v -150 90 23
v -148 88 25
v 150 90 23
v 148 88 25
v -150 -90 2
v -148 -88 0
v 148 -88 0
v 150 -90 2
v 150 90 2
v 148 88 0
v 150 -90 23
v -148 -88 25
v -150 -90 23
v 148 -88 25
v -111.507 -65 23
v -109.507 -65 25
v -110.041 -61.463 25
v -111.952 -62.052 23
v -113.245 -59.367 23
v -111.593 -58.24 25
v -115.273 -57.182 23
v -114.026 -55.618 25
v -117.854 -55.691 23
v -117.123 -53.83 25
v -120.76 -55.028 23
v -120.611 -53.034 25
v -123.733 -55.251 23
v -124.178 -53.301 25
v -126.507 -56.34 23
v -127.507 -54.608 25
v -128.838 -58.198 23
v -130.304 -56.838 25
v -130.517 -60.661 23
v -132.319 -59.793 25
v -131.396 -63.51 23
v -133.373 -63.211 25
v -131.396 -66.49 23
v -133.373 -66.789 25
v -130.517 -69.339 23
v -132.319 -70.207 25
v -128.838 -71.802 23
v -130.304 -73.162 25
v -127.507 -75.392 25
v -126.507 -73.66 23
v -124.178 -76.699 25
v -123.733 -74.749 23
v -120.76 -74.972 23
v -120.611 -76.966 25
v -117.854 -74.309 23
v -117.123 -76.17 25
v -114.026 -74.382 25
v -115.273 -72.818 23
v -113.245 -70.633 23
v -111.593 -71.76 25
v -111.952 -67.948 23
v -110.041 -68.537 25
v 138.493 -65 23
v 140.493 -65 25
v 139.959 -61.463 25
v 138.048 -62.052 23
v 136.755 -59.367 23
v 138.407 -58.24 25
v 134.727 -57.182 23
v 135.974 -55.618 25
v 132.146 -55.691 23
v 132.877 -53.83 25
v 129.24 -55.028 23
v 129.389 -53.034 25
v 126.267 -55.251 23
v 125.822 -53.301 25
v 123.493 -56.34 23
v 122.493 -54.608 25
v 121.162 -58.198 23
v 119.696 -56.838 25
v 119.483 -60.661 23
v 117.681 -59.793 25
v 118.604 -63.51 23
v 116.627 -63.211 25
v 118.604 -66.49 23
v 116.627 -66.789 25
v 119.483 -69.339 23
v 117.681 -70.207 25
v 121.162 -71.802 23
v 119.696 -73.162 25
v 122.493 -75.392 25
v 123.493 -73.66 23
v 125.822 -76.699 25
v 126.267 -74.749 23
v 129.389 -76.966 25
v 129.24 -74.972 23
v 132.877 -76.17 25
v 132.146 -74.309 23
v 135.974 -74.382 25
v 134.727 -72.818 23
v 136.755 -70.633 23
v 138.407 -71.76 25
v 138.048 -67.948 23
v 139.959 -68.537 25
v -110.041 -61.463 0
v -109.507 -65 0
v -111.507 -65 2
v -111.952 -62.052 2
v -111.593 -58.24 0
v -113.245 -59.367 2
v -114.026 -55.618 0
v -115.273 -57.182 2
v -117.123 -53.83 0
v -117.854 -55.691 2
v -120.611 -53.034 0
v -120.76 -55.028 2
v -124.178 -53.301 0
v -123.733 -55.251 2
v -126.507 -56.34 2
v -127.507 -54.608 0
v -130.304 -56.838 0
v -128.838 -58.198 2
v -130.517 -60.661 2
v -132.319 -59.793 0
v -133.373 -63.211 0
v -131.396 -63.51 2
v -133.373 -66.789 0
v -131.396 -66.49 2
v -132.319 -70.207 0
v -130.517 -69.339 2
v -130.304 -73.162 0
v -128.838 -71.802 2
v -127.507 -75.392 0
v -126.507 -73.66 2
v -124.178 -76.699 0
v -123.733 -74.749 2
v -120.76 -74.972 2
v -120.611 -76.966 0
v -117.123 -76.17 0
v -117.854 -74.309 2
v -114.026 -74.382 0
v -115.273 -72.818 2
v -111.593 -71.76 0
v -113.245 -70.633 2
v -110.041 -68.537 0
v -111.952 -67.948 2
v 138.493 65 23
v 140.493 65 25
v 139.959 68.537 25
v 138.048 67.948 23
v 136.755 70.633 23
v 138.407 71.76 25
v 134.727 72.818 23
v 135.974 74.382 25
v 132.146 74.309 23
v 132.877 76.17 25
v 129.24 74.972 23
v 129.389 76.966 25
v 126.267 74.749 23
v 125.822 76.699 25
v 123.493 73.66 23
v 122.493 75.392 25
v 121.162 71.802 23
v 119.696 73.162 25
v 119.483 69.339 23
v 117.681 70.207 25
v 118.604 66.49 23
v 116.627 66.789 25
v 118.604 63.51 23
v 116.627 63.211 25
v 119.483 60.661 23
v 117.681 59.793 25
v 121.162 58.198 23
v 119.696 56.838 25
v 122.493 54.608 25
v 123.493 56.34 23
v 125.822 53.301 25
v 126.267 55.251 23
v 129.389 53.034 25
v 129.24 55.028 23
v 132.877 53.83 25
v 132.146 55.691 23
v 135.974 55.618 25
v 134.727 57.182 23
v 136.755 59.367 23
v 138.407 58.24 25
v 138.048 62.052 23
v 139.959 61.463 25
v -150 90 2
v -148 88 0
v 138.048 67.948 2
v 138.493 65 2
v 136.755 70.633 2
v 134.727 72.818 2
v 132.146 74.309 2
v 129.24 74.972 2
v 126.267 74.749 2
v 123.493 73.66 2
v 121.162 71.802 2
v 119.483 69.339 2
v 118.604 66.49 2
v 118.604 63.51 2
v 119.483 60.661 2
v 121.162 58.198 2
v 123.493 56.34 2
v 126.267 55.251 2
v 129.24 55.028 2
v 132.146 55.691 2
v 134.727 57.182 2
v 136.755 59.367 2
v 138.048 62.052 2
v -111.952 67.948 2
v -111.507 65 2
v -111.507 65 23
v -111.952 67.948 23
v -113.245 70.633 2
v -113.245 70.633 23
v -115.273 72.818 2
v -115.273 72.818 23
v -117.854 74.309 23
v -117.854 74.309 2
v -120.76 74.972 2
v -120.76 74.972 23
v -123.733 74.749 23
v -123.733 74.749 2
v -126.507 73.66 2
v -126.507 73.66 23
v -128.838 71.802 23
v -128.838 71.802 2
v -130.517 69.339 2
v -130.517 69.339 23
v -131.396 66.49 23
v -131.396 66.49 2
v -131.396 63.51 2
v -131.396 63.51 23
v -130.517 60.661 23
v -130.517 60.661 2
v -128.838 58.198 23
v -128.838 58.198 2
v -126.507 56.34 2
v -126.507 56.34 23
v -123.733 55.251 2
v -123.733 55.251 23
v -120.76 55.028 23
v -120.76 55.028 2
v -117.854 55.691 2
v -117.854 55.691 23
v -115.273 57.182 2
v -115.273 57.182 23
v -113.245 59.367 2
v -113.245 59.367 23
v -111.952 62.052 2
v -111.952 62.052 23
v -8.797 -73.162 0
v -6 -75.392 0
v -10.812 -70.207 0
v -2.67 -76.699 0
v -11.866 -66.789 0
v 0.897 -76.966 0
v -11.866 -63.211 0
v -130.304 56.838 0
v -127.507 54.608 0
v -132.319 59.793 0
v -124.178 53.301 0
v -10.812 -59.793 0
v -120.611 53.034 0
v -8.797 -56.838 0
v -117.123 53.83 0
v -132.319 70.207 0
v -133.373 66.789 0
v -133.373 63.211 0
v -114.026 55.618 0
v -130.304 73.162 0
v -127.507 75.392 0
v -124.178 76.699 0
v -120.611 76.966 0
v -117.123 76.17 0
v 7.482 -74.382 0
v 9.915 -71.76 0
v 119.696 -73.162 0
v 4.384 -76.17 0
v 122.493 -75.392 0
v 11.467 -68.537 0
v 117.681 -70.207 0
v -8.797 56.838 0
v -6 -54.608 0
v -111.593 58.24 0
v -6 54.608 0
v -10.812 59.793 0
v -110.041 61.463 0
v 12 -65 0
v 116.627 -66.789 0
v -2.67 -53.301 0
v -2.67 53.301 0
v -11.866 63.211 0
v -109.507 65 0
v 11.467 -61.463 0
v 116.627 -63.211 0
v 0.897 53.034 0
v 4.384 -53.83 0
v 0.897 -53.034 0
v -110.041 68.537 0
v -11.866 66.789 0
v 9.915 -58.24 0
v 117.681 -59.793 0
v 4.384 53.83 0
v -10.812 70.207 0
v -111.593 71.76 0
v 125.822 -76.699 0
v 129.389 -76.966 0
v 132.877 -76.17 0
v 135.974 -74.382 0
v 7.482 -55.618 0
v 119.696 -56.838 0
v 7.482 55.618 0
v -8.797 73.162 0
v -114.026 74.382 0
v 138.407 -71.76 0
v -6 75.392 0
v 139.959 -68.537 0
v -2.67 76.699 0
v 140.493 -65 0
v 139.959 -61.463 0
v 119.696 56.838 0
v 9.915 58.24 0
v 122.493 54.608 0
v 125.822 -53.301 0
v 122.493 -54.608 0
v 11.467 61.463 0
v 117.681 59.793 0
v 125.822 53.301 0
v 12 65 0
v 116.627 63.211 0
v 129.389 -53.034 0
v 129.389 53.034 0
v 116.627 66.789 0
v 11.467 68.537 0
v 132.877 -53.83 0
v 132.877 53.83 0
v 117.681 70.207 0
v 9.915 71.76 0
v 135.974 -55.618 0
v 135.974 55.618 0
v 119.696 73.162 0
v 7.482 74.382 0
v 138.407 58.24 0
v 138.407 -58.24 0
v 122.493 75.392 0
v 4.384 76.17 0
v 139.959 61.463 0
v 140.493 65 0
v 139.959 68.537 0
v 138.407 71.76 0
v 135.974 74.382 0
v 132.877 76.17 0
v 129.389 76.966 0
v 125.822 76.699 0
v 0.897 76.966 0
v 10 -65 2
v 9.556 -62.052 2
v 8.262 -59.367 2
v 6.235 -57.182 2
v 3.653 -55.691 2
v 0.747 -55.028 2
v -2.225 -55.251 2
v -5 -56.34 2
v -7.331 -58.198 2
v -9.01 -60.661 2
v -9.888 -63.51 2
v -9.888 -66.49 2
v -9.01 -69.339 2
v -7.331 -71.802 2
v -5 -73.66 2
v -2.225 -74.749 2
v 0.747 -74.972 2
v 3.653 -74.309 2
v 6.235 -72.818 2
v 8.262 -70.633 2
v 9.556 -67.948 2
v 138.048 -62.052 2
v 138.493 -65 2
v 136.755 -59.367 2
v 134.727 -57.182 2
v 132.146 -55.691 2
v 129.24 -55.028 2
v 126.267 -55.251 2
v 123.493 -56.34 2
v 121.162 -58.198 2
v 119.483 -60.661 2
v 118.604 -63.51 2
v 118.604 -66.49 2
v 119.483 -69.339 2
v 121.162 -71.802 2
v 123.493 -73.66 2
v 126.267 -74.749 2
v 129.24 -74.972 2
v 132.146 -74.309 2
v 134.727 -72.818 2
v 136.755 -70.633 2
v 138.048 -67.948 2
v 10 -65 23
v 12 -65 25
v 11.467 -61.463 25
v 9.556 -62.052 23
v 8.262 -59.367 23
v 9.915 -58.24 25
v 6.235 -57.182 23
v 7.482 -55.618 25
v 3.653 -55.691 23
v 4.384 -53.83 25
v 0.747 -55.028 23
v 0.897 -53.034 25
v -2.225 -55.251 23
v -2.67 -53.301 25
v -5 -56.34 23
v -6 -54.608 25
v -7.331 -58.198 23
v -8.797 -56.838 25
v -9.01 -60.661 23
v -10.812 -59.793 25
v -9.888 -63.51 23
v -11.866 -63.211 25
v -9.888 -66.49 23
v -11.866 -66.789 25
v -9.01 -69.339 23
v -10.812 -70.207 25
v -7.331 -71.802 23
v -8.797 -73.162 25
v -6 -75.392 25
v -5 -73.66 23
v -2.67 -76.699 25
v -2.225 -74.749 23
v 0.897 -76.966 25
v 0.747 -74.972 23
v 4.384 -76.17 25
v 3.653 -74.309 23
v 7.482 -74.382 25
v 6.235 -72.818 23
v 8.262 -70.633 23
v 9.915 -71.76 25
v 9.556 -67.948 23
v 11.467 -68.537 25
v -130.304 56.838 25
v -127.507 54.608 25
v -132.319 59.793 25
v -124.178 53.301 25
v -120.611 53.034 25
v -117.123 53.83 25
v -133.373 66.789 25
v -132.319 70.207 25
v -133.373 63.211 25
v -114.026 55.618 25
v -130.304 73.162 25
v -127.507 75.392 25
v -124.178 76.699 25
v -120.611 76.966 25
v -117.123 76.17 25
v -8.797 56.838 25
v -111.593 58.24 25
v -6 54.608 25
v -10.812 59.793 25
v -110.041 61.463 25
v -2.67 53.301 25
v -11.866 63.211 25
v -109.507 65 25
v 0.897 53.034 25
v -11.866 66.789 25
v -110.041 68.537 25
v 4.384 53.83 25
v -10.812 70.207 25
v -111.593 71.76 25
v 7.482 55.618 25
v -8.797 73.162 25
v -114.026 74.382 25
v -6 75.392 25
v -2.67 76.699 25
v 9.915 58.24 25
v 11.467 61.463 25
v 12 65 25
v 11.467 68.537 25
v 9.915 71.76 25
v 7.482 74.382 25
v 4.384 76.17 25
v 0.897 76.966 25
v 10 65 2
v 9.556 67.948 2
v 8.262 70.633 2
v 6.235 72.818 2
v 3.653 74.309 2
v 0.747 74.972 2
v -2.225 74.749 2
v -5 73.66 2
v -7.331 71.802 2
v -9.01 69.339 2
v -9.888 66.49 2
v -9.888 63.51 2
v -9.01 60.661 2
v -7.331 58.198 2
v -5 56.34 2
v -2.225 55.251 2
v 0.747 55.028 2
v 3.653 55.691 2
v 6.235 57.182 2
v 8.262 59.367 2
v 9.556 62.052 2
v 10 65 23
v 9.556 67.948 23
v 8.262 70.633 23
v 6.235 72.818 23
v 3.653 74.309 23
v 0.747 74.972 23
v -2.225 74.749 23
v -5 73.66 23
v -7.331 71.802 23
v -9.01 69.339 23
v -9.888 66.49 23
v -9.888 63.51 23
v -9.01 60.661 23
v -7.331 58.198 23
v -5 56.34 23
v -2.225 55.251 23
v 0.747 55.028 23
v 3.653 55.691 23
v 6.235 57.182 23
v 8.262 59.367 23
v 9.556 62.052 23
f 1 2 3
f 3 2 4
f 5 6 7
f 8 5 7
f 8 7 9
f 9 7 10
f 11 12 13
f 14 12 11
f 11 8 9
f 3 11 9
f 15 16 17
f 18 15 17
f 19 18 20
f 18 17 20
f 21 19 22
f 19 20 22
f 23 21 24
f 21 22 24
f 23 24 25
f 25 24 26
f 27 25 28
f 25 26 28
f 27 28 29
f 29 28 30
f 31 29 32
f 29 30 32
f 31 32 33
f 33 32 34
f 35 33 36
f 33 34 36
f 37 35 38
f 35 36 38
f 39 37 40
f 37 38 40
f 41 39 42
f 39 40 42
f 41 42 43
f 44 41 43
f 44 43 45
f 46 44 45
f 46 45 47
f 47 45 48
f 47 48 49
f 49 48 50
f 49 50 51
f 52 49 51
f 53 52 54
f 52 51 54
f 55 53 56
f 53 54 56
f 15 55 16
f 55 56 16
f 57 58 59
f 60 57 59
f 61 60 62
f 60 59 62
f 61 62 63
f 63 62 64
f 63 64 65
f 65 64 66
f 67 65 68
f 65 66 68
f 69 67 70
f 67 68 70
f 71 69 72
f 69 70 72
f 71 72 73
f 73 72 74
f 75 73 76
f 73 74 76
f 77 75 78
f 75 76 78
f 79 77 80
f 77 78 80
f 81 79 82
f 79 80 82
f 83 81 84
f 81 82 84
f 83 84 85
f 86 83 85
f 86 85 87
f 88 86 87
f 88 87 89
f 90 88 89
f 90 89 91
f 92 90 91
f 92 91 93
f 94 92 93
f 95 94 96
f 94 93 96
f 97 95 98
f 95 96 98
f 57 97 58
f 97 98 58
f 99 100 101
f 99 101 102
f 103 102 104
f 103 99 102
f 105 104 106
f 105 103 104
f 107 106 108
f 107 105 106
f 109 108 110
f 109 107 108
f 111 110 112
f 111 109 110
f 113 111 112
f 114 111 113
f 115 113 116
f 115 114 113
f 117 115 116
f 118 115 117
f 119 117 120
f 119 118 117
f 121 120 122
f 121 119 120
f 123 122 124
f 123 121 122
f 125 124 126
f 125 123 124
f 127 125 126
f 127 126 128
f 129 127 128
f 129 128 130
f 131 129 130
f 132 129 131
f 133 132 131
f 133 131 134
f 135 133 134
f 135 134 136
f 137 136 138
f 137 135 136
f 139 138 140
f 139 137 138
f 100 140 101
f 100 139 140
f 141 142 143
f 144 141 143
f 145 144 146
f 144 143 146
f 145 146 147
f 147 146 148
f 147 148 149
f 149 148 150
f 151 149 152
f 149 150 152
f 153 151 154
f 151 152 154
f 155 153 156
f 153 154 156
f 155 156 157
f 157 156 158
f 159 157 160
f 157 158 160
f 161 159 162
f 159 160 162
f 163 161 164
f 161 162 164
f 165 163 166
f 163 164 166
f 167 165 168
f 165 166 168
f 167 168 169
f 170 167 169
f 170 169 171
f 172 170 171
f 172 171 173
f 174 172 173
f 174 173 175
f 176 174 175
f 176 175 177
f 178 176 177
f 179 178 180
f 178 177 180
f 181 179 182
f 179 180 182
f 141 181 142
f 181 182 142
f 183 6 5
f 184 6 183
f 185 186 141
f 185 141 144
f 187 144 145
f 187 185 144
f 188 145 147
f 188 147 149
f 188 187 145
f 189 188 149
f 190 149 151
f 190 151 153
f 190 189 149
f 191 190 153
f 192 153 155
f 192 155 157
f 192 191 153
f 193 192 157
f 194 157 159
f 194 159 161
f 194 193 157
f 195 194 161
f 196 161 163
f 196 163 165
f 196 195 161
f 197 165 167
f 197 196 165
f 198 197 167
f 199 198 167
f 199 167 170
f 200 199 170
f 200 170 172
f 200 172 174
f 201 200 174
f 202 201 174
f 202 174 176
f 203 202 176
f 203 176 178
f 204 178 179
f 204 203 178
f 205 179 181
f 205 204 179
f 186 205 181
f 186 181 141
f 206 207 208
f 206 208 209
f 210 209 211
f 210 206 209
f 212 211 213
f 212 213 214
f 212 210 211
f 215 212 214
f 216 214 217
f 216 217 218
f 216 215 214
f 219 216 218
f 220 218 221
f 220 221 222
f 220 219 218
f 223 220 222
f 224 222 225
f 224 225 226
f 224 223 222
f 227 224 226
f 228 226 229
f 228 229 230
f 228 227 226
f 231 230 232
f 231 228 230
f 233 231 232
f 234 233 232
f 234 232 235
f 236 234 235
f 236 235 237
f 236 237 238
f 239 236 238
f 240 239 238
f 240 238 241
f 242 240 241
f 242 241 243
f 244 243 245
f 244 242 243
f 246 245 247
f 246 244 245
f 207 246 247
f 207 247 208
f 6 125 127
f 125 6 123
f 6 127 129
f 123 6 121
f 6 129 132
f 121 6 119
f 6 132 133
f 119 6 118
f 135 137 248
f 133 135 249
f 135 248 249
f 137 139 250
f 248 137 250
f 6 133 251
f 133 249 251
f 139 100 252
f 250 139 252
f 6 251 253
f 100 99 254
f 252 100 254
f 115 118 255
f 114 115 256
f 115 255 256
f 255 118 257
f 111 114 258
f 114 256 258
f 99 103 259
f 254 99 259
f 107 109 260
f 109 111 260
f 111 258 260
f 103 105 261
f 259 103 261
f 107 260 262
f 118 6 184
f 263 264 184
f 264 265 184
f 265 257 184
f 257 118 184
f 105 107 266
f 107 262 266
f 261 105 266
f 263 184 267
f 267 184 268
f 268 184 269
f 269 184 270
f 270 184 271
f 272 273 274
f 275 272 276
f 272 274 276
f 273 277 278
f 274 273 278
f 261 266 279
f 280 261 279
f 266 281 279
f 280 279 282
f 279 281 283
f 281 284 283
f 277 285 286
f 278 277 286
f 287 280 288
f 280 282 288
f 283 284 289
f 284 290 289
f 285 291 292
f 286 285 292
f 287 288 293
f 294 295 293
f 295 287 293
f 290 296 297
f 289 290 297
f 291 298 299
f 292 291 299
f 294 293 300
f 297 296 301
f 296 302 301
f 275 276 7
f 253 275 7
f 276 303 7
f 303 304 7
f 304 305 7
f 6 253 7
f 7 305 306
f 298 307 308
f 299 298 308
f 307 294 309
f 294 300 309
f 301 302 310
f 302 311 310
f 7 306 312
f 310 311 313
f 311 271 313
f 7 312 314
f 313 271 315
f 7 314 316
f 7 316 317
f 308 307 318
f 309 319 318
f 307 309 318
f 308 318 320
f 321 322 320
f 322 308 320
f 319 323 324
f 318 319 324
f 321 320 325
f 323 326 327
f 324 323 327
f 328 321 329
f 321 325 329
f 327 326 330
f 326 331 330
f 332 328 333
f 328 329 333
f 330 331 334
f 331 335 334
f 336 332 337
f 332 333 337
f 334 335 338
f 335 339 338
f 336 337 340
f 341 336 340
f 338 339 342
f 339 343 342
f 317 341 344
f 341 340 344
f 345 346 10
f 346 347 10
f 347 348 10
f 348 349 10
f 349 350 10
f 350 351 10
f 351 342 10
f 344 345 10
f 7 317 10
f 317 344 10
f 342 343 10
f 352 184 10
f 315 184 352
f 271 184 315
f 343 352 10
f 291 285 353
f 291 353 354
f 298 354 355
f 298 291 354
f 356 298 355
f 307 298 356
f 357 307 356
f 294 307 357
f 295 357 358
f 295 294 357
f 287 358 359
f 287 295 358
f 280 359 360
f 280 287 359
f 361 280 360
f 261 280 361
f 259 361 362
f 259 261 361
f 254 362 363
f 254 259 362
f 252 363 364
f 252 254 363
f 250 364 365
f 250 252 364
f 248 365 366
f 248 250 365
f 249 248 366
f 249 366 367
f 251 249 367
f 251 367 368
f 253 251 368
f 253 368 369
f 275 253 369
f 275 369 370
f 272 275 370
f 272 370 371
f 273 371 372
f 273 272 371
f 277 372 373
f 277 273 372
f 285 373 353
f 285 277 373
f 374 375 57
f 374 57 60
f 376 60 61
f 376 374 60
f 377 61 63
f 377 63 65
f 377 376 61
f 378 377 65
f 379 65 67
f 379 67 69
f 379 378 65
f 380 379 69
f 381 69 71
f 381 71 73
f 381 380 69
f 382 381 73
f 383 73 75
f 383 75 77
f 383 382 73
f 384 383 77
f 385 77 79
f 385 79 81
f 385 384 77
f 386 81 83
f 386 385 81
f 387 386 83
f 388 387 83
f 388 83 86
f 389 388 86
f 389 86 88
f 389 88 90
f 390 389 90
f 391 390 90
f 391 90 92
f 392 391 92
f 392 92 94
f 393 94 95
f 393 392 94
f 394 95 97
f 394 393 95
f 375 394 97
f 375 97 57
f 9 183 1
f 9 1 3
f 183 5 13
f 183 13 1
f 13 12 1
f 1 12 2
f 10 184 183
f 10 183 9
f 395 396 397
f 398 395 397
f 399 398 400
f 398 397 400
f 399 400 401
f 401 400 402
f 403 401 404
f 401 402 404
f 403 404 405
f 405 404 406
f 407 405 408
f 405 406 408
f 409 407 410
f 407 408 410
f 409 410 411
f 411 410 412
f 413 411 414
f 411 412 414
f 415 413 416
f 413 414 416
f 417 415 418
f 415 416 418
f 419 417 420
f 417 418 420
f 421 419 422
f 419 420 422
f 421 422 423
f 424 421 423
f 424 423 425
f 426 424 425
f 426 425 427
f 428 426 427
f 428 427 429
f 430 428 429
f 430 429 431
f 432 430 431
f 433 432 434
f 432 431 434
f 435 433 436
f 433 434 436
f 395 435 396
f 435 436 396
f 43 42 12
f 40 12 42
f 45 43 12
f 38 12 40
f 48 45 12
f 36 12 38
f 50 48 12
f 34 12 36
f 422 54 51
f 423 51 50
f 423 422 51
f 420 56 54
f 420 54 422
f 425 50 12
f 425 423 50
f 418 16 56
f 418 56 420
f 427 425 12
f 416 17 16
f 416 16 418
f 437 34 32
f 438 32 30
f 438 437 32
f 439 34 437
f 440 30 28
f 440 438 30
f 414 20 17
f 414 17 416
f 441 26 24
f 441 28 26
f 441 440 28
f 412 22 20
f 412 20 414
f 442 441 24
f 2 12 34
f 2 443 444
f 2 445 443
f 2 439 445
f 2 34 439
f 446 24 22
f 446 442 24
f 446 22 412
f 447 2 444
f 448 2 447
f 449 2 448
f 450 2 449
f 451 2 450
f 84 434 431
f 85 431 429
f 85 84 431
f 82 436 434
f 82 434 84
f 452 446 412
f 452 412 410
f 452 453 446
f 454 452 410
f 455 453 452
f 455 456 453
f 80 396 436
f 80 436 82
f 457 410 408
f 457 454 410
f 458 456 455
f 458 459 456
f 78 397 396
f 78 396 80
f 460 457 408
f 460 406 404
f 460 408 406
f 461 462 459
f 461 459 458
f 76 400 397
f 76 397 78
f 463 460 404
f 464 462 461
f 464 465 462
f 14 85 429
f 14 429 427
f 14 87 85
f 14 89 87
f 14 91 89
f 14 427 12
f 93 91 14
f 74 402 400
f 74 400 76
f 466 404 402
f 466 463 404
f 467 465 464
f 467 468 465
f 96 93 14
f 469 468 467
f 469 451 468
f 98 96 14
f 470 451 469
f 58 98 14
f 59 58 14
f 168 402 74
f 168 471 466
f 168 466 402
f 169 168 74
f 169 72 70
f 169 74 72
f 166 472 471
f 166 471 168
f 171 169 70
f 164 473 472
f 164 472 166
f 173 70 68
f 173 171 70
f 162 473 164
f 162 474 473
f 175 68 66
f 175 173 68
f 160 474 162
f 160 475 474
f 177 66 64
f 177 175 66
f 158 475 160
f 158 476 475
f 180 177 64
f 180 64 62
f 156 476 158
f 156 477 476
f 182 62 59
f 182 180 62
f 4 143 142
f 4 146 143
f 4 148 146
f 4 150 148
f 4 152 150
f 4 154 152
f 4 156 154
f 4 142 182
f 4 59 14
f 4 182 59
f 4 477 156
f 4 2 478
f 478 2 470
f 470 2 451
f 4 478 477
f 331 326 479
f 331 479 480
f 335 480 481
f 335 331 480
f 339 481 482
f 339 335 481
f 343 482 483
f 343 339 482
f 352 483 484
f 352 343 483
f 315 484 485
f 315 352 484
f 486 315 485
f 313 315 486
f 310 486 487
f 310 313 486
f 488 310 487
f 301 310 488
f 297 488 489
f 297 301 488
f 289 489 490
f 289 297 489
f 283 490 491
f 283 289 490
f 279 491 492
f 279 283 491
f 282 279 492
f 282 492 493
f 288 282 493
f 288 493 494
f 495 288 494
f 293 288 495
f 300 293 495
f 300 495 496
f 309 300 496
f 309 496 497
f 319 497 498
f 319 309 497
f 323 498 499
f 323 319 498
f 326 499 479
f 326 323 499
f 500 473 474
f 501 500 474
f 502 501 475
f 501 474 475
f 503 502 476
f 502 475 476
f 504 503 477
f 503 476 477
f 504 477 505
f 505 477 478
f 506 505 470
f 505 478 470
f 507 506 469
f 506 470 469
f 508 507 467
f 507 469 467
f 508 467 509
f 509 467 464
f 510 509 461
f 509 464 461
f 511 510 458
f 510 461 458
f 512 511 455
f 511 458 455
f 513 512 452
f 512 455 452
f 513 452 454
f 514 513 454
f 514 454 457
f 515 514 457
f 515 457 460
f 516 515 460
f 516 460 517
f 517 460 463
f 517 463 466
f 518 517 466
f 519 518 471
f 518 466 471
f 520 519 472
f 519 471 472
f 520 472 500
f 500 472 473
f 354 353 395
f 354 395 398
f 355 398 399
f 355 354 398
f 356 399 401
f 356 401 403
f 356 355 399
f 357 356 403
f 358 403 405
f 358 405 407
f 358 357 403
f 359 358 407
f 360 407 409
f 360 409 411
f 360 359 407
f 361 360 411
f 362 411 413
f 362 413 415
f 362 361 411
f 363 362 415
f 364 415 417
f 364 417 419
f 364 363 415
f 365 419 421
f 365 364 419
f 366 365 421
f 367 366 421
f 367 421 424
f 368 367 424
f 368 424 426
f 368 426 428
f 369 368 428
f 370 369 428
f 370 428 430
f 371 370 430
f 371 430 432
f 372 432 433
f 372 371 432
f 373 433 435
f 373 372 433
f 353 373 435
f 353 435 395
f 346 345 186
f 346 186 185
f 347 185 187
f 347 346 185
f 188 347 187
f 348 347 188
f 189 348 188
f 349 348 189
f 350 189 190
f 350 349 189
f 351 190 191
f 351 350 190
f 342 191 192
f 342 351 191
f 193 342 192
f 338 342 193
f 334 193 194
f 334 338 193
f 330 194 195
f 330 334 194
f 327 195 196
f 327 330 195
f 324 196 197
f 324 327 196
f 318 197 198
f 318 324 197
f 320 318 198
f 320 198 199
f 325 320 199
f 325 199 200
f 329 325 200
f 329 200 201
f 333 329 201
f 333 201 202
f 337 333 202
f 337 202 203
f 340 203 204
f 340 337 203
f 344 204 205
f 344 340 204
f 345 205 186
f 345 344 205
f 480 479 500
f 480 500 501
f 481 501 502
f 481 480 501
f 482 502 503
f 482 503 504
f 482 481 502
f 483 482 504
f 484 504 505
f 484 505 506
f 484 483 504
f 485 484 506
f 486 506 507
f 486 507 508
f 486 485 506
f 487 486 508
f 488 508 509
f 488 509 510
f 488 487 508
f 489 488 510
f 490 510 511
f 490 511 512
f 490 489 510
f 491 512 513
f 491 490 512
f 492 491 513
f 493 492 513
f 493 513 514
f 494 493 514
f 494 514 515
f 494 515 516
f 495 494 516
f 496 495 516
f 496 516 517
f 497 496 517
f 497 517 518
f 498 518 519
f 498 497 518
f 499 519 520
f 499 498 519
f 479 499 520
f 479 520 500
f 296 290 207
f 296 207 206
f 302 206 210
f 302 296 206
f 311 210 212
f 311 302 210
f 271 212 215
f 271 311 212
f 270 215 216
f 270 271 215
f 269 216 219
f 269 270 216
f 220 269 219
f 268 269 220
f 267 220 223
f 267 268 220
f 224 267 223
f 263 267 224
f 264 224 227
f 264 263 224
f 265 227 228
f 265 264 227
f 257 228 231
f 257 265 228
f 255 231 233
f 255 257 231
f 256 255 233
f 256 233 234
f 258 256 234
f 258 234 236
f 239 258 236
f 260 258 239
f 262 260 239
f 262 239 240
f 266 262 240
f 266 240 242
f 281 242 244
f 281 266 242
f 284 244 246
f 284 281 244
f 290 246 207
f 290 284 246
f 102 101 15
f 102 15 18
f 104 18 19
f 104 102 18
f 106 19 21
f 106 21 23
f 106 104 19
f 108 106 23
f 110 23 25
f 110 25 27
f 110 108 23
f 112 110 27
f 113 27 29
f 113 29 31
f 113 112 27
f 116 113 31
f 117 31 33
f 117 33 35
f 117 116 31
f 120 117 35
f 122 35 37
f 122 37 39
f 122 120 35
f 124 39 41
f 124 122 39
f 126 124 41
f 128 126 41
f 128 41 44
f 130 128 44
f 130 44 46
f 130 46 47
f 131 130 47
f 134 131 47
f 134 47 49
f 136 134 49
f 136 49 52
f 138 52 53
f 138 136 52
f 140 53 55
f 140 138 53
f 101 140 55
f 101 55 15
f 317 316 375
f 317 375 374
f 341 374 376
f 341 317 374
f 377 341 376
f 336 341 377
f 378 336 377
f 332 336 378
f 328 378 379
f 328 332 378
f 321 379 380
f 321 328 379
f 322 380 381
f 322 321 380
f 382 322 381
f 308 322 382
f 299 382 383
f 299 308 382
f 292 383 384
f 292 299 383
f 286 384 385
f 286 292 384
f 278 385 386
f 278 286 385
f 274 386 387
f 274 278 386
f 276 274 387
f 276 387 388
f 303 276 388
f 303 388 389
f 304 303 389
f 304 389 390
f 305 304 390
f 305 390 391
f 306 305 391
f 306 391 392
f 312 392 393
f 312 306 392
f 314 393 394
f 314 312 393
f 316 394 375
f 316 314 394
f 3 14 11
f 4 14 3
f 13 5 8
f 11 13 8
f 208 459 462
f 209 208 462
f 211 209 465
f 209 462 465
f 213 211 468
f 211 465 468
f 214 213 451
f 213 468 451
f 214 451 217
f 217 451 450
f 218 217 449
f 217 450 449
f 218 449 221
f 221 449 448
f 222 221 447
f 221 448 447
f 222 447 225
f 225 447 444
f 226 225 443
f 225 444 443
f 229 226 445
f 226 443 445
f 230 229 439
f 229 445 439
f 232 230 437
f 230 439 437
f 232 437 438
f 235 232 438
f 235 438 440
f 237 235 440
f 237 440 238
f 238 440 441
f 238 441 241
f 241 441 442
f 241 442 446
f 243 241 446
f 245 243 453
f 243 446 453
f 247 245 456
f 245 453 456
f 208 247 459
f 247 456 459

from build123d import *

# Parameters (mm, degrees)
F0_W     = 300
F0_H     = 180
F0_R     = 10
F1_DEPTH = 25
F2_SIZE  = 2


with BuildPart() as f1:
    # F0 (on Top) → F1 (new body)
    with BuildSketch(Plane.XY):
        Rectangle(F0_W, F0_H)
        with Locations((-121.507466, -65)):
            Circle(F0_R, mode=Mode.SUBTRACT)
        with Locations((0, -65)):
            Circle(F0_R, mode=Mode.SUBTRACT)
        with Locations((128.492534, -65)):
            Circle(F0_R, mode=Mode.SUBTRACT)
        with Locations((-121.507466, 65)):
            Circle(F0_R, mode=Mode.SUBTRACT)
        with Locations((0, 65)):
            Circle(F0_R, mode=Mode.SUBTRACT)
        with Locations((128.492534, 65)):
            Circle(F0_R, mode=Mode.SUBTRACT)
    extrude(amount=F1_DEPTH)

    # F2
    f2_edges = [f1.edges().sort_by_distance(p)[0] for p in [
        (150, 0, 25),
        (0, 90, 25),
        (-150, 0, 25),
        (0, -90, 25),
        (-131.507466, -65, 25),
        (-10, -65, 25),
        (118.492534, -65, 25),
        (-131.507466, 65, 25),
        (-10, 65, 25),
        (118.492534, 65, 25),
        (150, 0, 0),
        (0, 90, 0),
        (-150, 0, 0),
        (0, -90, 0),
        (-131.507466, -65, 0),
        (-10, -65, 0),
        (118.492534, -65, 0),
        (-131.507466, 65, 0),
        (-10, 65, 0),
        (118.492534, 65, 0),
    ]]
    chamfer(f2_edges, length=F2_SIZE)


solid = f1.part
